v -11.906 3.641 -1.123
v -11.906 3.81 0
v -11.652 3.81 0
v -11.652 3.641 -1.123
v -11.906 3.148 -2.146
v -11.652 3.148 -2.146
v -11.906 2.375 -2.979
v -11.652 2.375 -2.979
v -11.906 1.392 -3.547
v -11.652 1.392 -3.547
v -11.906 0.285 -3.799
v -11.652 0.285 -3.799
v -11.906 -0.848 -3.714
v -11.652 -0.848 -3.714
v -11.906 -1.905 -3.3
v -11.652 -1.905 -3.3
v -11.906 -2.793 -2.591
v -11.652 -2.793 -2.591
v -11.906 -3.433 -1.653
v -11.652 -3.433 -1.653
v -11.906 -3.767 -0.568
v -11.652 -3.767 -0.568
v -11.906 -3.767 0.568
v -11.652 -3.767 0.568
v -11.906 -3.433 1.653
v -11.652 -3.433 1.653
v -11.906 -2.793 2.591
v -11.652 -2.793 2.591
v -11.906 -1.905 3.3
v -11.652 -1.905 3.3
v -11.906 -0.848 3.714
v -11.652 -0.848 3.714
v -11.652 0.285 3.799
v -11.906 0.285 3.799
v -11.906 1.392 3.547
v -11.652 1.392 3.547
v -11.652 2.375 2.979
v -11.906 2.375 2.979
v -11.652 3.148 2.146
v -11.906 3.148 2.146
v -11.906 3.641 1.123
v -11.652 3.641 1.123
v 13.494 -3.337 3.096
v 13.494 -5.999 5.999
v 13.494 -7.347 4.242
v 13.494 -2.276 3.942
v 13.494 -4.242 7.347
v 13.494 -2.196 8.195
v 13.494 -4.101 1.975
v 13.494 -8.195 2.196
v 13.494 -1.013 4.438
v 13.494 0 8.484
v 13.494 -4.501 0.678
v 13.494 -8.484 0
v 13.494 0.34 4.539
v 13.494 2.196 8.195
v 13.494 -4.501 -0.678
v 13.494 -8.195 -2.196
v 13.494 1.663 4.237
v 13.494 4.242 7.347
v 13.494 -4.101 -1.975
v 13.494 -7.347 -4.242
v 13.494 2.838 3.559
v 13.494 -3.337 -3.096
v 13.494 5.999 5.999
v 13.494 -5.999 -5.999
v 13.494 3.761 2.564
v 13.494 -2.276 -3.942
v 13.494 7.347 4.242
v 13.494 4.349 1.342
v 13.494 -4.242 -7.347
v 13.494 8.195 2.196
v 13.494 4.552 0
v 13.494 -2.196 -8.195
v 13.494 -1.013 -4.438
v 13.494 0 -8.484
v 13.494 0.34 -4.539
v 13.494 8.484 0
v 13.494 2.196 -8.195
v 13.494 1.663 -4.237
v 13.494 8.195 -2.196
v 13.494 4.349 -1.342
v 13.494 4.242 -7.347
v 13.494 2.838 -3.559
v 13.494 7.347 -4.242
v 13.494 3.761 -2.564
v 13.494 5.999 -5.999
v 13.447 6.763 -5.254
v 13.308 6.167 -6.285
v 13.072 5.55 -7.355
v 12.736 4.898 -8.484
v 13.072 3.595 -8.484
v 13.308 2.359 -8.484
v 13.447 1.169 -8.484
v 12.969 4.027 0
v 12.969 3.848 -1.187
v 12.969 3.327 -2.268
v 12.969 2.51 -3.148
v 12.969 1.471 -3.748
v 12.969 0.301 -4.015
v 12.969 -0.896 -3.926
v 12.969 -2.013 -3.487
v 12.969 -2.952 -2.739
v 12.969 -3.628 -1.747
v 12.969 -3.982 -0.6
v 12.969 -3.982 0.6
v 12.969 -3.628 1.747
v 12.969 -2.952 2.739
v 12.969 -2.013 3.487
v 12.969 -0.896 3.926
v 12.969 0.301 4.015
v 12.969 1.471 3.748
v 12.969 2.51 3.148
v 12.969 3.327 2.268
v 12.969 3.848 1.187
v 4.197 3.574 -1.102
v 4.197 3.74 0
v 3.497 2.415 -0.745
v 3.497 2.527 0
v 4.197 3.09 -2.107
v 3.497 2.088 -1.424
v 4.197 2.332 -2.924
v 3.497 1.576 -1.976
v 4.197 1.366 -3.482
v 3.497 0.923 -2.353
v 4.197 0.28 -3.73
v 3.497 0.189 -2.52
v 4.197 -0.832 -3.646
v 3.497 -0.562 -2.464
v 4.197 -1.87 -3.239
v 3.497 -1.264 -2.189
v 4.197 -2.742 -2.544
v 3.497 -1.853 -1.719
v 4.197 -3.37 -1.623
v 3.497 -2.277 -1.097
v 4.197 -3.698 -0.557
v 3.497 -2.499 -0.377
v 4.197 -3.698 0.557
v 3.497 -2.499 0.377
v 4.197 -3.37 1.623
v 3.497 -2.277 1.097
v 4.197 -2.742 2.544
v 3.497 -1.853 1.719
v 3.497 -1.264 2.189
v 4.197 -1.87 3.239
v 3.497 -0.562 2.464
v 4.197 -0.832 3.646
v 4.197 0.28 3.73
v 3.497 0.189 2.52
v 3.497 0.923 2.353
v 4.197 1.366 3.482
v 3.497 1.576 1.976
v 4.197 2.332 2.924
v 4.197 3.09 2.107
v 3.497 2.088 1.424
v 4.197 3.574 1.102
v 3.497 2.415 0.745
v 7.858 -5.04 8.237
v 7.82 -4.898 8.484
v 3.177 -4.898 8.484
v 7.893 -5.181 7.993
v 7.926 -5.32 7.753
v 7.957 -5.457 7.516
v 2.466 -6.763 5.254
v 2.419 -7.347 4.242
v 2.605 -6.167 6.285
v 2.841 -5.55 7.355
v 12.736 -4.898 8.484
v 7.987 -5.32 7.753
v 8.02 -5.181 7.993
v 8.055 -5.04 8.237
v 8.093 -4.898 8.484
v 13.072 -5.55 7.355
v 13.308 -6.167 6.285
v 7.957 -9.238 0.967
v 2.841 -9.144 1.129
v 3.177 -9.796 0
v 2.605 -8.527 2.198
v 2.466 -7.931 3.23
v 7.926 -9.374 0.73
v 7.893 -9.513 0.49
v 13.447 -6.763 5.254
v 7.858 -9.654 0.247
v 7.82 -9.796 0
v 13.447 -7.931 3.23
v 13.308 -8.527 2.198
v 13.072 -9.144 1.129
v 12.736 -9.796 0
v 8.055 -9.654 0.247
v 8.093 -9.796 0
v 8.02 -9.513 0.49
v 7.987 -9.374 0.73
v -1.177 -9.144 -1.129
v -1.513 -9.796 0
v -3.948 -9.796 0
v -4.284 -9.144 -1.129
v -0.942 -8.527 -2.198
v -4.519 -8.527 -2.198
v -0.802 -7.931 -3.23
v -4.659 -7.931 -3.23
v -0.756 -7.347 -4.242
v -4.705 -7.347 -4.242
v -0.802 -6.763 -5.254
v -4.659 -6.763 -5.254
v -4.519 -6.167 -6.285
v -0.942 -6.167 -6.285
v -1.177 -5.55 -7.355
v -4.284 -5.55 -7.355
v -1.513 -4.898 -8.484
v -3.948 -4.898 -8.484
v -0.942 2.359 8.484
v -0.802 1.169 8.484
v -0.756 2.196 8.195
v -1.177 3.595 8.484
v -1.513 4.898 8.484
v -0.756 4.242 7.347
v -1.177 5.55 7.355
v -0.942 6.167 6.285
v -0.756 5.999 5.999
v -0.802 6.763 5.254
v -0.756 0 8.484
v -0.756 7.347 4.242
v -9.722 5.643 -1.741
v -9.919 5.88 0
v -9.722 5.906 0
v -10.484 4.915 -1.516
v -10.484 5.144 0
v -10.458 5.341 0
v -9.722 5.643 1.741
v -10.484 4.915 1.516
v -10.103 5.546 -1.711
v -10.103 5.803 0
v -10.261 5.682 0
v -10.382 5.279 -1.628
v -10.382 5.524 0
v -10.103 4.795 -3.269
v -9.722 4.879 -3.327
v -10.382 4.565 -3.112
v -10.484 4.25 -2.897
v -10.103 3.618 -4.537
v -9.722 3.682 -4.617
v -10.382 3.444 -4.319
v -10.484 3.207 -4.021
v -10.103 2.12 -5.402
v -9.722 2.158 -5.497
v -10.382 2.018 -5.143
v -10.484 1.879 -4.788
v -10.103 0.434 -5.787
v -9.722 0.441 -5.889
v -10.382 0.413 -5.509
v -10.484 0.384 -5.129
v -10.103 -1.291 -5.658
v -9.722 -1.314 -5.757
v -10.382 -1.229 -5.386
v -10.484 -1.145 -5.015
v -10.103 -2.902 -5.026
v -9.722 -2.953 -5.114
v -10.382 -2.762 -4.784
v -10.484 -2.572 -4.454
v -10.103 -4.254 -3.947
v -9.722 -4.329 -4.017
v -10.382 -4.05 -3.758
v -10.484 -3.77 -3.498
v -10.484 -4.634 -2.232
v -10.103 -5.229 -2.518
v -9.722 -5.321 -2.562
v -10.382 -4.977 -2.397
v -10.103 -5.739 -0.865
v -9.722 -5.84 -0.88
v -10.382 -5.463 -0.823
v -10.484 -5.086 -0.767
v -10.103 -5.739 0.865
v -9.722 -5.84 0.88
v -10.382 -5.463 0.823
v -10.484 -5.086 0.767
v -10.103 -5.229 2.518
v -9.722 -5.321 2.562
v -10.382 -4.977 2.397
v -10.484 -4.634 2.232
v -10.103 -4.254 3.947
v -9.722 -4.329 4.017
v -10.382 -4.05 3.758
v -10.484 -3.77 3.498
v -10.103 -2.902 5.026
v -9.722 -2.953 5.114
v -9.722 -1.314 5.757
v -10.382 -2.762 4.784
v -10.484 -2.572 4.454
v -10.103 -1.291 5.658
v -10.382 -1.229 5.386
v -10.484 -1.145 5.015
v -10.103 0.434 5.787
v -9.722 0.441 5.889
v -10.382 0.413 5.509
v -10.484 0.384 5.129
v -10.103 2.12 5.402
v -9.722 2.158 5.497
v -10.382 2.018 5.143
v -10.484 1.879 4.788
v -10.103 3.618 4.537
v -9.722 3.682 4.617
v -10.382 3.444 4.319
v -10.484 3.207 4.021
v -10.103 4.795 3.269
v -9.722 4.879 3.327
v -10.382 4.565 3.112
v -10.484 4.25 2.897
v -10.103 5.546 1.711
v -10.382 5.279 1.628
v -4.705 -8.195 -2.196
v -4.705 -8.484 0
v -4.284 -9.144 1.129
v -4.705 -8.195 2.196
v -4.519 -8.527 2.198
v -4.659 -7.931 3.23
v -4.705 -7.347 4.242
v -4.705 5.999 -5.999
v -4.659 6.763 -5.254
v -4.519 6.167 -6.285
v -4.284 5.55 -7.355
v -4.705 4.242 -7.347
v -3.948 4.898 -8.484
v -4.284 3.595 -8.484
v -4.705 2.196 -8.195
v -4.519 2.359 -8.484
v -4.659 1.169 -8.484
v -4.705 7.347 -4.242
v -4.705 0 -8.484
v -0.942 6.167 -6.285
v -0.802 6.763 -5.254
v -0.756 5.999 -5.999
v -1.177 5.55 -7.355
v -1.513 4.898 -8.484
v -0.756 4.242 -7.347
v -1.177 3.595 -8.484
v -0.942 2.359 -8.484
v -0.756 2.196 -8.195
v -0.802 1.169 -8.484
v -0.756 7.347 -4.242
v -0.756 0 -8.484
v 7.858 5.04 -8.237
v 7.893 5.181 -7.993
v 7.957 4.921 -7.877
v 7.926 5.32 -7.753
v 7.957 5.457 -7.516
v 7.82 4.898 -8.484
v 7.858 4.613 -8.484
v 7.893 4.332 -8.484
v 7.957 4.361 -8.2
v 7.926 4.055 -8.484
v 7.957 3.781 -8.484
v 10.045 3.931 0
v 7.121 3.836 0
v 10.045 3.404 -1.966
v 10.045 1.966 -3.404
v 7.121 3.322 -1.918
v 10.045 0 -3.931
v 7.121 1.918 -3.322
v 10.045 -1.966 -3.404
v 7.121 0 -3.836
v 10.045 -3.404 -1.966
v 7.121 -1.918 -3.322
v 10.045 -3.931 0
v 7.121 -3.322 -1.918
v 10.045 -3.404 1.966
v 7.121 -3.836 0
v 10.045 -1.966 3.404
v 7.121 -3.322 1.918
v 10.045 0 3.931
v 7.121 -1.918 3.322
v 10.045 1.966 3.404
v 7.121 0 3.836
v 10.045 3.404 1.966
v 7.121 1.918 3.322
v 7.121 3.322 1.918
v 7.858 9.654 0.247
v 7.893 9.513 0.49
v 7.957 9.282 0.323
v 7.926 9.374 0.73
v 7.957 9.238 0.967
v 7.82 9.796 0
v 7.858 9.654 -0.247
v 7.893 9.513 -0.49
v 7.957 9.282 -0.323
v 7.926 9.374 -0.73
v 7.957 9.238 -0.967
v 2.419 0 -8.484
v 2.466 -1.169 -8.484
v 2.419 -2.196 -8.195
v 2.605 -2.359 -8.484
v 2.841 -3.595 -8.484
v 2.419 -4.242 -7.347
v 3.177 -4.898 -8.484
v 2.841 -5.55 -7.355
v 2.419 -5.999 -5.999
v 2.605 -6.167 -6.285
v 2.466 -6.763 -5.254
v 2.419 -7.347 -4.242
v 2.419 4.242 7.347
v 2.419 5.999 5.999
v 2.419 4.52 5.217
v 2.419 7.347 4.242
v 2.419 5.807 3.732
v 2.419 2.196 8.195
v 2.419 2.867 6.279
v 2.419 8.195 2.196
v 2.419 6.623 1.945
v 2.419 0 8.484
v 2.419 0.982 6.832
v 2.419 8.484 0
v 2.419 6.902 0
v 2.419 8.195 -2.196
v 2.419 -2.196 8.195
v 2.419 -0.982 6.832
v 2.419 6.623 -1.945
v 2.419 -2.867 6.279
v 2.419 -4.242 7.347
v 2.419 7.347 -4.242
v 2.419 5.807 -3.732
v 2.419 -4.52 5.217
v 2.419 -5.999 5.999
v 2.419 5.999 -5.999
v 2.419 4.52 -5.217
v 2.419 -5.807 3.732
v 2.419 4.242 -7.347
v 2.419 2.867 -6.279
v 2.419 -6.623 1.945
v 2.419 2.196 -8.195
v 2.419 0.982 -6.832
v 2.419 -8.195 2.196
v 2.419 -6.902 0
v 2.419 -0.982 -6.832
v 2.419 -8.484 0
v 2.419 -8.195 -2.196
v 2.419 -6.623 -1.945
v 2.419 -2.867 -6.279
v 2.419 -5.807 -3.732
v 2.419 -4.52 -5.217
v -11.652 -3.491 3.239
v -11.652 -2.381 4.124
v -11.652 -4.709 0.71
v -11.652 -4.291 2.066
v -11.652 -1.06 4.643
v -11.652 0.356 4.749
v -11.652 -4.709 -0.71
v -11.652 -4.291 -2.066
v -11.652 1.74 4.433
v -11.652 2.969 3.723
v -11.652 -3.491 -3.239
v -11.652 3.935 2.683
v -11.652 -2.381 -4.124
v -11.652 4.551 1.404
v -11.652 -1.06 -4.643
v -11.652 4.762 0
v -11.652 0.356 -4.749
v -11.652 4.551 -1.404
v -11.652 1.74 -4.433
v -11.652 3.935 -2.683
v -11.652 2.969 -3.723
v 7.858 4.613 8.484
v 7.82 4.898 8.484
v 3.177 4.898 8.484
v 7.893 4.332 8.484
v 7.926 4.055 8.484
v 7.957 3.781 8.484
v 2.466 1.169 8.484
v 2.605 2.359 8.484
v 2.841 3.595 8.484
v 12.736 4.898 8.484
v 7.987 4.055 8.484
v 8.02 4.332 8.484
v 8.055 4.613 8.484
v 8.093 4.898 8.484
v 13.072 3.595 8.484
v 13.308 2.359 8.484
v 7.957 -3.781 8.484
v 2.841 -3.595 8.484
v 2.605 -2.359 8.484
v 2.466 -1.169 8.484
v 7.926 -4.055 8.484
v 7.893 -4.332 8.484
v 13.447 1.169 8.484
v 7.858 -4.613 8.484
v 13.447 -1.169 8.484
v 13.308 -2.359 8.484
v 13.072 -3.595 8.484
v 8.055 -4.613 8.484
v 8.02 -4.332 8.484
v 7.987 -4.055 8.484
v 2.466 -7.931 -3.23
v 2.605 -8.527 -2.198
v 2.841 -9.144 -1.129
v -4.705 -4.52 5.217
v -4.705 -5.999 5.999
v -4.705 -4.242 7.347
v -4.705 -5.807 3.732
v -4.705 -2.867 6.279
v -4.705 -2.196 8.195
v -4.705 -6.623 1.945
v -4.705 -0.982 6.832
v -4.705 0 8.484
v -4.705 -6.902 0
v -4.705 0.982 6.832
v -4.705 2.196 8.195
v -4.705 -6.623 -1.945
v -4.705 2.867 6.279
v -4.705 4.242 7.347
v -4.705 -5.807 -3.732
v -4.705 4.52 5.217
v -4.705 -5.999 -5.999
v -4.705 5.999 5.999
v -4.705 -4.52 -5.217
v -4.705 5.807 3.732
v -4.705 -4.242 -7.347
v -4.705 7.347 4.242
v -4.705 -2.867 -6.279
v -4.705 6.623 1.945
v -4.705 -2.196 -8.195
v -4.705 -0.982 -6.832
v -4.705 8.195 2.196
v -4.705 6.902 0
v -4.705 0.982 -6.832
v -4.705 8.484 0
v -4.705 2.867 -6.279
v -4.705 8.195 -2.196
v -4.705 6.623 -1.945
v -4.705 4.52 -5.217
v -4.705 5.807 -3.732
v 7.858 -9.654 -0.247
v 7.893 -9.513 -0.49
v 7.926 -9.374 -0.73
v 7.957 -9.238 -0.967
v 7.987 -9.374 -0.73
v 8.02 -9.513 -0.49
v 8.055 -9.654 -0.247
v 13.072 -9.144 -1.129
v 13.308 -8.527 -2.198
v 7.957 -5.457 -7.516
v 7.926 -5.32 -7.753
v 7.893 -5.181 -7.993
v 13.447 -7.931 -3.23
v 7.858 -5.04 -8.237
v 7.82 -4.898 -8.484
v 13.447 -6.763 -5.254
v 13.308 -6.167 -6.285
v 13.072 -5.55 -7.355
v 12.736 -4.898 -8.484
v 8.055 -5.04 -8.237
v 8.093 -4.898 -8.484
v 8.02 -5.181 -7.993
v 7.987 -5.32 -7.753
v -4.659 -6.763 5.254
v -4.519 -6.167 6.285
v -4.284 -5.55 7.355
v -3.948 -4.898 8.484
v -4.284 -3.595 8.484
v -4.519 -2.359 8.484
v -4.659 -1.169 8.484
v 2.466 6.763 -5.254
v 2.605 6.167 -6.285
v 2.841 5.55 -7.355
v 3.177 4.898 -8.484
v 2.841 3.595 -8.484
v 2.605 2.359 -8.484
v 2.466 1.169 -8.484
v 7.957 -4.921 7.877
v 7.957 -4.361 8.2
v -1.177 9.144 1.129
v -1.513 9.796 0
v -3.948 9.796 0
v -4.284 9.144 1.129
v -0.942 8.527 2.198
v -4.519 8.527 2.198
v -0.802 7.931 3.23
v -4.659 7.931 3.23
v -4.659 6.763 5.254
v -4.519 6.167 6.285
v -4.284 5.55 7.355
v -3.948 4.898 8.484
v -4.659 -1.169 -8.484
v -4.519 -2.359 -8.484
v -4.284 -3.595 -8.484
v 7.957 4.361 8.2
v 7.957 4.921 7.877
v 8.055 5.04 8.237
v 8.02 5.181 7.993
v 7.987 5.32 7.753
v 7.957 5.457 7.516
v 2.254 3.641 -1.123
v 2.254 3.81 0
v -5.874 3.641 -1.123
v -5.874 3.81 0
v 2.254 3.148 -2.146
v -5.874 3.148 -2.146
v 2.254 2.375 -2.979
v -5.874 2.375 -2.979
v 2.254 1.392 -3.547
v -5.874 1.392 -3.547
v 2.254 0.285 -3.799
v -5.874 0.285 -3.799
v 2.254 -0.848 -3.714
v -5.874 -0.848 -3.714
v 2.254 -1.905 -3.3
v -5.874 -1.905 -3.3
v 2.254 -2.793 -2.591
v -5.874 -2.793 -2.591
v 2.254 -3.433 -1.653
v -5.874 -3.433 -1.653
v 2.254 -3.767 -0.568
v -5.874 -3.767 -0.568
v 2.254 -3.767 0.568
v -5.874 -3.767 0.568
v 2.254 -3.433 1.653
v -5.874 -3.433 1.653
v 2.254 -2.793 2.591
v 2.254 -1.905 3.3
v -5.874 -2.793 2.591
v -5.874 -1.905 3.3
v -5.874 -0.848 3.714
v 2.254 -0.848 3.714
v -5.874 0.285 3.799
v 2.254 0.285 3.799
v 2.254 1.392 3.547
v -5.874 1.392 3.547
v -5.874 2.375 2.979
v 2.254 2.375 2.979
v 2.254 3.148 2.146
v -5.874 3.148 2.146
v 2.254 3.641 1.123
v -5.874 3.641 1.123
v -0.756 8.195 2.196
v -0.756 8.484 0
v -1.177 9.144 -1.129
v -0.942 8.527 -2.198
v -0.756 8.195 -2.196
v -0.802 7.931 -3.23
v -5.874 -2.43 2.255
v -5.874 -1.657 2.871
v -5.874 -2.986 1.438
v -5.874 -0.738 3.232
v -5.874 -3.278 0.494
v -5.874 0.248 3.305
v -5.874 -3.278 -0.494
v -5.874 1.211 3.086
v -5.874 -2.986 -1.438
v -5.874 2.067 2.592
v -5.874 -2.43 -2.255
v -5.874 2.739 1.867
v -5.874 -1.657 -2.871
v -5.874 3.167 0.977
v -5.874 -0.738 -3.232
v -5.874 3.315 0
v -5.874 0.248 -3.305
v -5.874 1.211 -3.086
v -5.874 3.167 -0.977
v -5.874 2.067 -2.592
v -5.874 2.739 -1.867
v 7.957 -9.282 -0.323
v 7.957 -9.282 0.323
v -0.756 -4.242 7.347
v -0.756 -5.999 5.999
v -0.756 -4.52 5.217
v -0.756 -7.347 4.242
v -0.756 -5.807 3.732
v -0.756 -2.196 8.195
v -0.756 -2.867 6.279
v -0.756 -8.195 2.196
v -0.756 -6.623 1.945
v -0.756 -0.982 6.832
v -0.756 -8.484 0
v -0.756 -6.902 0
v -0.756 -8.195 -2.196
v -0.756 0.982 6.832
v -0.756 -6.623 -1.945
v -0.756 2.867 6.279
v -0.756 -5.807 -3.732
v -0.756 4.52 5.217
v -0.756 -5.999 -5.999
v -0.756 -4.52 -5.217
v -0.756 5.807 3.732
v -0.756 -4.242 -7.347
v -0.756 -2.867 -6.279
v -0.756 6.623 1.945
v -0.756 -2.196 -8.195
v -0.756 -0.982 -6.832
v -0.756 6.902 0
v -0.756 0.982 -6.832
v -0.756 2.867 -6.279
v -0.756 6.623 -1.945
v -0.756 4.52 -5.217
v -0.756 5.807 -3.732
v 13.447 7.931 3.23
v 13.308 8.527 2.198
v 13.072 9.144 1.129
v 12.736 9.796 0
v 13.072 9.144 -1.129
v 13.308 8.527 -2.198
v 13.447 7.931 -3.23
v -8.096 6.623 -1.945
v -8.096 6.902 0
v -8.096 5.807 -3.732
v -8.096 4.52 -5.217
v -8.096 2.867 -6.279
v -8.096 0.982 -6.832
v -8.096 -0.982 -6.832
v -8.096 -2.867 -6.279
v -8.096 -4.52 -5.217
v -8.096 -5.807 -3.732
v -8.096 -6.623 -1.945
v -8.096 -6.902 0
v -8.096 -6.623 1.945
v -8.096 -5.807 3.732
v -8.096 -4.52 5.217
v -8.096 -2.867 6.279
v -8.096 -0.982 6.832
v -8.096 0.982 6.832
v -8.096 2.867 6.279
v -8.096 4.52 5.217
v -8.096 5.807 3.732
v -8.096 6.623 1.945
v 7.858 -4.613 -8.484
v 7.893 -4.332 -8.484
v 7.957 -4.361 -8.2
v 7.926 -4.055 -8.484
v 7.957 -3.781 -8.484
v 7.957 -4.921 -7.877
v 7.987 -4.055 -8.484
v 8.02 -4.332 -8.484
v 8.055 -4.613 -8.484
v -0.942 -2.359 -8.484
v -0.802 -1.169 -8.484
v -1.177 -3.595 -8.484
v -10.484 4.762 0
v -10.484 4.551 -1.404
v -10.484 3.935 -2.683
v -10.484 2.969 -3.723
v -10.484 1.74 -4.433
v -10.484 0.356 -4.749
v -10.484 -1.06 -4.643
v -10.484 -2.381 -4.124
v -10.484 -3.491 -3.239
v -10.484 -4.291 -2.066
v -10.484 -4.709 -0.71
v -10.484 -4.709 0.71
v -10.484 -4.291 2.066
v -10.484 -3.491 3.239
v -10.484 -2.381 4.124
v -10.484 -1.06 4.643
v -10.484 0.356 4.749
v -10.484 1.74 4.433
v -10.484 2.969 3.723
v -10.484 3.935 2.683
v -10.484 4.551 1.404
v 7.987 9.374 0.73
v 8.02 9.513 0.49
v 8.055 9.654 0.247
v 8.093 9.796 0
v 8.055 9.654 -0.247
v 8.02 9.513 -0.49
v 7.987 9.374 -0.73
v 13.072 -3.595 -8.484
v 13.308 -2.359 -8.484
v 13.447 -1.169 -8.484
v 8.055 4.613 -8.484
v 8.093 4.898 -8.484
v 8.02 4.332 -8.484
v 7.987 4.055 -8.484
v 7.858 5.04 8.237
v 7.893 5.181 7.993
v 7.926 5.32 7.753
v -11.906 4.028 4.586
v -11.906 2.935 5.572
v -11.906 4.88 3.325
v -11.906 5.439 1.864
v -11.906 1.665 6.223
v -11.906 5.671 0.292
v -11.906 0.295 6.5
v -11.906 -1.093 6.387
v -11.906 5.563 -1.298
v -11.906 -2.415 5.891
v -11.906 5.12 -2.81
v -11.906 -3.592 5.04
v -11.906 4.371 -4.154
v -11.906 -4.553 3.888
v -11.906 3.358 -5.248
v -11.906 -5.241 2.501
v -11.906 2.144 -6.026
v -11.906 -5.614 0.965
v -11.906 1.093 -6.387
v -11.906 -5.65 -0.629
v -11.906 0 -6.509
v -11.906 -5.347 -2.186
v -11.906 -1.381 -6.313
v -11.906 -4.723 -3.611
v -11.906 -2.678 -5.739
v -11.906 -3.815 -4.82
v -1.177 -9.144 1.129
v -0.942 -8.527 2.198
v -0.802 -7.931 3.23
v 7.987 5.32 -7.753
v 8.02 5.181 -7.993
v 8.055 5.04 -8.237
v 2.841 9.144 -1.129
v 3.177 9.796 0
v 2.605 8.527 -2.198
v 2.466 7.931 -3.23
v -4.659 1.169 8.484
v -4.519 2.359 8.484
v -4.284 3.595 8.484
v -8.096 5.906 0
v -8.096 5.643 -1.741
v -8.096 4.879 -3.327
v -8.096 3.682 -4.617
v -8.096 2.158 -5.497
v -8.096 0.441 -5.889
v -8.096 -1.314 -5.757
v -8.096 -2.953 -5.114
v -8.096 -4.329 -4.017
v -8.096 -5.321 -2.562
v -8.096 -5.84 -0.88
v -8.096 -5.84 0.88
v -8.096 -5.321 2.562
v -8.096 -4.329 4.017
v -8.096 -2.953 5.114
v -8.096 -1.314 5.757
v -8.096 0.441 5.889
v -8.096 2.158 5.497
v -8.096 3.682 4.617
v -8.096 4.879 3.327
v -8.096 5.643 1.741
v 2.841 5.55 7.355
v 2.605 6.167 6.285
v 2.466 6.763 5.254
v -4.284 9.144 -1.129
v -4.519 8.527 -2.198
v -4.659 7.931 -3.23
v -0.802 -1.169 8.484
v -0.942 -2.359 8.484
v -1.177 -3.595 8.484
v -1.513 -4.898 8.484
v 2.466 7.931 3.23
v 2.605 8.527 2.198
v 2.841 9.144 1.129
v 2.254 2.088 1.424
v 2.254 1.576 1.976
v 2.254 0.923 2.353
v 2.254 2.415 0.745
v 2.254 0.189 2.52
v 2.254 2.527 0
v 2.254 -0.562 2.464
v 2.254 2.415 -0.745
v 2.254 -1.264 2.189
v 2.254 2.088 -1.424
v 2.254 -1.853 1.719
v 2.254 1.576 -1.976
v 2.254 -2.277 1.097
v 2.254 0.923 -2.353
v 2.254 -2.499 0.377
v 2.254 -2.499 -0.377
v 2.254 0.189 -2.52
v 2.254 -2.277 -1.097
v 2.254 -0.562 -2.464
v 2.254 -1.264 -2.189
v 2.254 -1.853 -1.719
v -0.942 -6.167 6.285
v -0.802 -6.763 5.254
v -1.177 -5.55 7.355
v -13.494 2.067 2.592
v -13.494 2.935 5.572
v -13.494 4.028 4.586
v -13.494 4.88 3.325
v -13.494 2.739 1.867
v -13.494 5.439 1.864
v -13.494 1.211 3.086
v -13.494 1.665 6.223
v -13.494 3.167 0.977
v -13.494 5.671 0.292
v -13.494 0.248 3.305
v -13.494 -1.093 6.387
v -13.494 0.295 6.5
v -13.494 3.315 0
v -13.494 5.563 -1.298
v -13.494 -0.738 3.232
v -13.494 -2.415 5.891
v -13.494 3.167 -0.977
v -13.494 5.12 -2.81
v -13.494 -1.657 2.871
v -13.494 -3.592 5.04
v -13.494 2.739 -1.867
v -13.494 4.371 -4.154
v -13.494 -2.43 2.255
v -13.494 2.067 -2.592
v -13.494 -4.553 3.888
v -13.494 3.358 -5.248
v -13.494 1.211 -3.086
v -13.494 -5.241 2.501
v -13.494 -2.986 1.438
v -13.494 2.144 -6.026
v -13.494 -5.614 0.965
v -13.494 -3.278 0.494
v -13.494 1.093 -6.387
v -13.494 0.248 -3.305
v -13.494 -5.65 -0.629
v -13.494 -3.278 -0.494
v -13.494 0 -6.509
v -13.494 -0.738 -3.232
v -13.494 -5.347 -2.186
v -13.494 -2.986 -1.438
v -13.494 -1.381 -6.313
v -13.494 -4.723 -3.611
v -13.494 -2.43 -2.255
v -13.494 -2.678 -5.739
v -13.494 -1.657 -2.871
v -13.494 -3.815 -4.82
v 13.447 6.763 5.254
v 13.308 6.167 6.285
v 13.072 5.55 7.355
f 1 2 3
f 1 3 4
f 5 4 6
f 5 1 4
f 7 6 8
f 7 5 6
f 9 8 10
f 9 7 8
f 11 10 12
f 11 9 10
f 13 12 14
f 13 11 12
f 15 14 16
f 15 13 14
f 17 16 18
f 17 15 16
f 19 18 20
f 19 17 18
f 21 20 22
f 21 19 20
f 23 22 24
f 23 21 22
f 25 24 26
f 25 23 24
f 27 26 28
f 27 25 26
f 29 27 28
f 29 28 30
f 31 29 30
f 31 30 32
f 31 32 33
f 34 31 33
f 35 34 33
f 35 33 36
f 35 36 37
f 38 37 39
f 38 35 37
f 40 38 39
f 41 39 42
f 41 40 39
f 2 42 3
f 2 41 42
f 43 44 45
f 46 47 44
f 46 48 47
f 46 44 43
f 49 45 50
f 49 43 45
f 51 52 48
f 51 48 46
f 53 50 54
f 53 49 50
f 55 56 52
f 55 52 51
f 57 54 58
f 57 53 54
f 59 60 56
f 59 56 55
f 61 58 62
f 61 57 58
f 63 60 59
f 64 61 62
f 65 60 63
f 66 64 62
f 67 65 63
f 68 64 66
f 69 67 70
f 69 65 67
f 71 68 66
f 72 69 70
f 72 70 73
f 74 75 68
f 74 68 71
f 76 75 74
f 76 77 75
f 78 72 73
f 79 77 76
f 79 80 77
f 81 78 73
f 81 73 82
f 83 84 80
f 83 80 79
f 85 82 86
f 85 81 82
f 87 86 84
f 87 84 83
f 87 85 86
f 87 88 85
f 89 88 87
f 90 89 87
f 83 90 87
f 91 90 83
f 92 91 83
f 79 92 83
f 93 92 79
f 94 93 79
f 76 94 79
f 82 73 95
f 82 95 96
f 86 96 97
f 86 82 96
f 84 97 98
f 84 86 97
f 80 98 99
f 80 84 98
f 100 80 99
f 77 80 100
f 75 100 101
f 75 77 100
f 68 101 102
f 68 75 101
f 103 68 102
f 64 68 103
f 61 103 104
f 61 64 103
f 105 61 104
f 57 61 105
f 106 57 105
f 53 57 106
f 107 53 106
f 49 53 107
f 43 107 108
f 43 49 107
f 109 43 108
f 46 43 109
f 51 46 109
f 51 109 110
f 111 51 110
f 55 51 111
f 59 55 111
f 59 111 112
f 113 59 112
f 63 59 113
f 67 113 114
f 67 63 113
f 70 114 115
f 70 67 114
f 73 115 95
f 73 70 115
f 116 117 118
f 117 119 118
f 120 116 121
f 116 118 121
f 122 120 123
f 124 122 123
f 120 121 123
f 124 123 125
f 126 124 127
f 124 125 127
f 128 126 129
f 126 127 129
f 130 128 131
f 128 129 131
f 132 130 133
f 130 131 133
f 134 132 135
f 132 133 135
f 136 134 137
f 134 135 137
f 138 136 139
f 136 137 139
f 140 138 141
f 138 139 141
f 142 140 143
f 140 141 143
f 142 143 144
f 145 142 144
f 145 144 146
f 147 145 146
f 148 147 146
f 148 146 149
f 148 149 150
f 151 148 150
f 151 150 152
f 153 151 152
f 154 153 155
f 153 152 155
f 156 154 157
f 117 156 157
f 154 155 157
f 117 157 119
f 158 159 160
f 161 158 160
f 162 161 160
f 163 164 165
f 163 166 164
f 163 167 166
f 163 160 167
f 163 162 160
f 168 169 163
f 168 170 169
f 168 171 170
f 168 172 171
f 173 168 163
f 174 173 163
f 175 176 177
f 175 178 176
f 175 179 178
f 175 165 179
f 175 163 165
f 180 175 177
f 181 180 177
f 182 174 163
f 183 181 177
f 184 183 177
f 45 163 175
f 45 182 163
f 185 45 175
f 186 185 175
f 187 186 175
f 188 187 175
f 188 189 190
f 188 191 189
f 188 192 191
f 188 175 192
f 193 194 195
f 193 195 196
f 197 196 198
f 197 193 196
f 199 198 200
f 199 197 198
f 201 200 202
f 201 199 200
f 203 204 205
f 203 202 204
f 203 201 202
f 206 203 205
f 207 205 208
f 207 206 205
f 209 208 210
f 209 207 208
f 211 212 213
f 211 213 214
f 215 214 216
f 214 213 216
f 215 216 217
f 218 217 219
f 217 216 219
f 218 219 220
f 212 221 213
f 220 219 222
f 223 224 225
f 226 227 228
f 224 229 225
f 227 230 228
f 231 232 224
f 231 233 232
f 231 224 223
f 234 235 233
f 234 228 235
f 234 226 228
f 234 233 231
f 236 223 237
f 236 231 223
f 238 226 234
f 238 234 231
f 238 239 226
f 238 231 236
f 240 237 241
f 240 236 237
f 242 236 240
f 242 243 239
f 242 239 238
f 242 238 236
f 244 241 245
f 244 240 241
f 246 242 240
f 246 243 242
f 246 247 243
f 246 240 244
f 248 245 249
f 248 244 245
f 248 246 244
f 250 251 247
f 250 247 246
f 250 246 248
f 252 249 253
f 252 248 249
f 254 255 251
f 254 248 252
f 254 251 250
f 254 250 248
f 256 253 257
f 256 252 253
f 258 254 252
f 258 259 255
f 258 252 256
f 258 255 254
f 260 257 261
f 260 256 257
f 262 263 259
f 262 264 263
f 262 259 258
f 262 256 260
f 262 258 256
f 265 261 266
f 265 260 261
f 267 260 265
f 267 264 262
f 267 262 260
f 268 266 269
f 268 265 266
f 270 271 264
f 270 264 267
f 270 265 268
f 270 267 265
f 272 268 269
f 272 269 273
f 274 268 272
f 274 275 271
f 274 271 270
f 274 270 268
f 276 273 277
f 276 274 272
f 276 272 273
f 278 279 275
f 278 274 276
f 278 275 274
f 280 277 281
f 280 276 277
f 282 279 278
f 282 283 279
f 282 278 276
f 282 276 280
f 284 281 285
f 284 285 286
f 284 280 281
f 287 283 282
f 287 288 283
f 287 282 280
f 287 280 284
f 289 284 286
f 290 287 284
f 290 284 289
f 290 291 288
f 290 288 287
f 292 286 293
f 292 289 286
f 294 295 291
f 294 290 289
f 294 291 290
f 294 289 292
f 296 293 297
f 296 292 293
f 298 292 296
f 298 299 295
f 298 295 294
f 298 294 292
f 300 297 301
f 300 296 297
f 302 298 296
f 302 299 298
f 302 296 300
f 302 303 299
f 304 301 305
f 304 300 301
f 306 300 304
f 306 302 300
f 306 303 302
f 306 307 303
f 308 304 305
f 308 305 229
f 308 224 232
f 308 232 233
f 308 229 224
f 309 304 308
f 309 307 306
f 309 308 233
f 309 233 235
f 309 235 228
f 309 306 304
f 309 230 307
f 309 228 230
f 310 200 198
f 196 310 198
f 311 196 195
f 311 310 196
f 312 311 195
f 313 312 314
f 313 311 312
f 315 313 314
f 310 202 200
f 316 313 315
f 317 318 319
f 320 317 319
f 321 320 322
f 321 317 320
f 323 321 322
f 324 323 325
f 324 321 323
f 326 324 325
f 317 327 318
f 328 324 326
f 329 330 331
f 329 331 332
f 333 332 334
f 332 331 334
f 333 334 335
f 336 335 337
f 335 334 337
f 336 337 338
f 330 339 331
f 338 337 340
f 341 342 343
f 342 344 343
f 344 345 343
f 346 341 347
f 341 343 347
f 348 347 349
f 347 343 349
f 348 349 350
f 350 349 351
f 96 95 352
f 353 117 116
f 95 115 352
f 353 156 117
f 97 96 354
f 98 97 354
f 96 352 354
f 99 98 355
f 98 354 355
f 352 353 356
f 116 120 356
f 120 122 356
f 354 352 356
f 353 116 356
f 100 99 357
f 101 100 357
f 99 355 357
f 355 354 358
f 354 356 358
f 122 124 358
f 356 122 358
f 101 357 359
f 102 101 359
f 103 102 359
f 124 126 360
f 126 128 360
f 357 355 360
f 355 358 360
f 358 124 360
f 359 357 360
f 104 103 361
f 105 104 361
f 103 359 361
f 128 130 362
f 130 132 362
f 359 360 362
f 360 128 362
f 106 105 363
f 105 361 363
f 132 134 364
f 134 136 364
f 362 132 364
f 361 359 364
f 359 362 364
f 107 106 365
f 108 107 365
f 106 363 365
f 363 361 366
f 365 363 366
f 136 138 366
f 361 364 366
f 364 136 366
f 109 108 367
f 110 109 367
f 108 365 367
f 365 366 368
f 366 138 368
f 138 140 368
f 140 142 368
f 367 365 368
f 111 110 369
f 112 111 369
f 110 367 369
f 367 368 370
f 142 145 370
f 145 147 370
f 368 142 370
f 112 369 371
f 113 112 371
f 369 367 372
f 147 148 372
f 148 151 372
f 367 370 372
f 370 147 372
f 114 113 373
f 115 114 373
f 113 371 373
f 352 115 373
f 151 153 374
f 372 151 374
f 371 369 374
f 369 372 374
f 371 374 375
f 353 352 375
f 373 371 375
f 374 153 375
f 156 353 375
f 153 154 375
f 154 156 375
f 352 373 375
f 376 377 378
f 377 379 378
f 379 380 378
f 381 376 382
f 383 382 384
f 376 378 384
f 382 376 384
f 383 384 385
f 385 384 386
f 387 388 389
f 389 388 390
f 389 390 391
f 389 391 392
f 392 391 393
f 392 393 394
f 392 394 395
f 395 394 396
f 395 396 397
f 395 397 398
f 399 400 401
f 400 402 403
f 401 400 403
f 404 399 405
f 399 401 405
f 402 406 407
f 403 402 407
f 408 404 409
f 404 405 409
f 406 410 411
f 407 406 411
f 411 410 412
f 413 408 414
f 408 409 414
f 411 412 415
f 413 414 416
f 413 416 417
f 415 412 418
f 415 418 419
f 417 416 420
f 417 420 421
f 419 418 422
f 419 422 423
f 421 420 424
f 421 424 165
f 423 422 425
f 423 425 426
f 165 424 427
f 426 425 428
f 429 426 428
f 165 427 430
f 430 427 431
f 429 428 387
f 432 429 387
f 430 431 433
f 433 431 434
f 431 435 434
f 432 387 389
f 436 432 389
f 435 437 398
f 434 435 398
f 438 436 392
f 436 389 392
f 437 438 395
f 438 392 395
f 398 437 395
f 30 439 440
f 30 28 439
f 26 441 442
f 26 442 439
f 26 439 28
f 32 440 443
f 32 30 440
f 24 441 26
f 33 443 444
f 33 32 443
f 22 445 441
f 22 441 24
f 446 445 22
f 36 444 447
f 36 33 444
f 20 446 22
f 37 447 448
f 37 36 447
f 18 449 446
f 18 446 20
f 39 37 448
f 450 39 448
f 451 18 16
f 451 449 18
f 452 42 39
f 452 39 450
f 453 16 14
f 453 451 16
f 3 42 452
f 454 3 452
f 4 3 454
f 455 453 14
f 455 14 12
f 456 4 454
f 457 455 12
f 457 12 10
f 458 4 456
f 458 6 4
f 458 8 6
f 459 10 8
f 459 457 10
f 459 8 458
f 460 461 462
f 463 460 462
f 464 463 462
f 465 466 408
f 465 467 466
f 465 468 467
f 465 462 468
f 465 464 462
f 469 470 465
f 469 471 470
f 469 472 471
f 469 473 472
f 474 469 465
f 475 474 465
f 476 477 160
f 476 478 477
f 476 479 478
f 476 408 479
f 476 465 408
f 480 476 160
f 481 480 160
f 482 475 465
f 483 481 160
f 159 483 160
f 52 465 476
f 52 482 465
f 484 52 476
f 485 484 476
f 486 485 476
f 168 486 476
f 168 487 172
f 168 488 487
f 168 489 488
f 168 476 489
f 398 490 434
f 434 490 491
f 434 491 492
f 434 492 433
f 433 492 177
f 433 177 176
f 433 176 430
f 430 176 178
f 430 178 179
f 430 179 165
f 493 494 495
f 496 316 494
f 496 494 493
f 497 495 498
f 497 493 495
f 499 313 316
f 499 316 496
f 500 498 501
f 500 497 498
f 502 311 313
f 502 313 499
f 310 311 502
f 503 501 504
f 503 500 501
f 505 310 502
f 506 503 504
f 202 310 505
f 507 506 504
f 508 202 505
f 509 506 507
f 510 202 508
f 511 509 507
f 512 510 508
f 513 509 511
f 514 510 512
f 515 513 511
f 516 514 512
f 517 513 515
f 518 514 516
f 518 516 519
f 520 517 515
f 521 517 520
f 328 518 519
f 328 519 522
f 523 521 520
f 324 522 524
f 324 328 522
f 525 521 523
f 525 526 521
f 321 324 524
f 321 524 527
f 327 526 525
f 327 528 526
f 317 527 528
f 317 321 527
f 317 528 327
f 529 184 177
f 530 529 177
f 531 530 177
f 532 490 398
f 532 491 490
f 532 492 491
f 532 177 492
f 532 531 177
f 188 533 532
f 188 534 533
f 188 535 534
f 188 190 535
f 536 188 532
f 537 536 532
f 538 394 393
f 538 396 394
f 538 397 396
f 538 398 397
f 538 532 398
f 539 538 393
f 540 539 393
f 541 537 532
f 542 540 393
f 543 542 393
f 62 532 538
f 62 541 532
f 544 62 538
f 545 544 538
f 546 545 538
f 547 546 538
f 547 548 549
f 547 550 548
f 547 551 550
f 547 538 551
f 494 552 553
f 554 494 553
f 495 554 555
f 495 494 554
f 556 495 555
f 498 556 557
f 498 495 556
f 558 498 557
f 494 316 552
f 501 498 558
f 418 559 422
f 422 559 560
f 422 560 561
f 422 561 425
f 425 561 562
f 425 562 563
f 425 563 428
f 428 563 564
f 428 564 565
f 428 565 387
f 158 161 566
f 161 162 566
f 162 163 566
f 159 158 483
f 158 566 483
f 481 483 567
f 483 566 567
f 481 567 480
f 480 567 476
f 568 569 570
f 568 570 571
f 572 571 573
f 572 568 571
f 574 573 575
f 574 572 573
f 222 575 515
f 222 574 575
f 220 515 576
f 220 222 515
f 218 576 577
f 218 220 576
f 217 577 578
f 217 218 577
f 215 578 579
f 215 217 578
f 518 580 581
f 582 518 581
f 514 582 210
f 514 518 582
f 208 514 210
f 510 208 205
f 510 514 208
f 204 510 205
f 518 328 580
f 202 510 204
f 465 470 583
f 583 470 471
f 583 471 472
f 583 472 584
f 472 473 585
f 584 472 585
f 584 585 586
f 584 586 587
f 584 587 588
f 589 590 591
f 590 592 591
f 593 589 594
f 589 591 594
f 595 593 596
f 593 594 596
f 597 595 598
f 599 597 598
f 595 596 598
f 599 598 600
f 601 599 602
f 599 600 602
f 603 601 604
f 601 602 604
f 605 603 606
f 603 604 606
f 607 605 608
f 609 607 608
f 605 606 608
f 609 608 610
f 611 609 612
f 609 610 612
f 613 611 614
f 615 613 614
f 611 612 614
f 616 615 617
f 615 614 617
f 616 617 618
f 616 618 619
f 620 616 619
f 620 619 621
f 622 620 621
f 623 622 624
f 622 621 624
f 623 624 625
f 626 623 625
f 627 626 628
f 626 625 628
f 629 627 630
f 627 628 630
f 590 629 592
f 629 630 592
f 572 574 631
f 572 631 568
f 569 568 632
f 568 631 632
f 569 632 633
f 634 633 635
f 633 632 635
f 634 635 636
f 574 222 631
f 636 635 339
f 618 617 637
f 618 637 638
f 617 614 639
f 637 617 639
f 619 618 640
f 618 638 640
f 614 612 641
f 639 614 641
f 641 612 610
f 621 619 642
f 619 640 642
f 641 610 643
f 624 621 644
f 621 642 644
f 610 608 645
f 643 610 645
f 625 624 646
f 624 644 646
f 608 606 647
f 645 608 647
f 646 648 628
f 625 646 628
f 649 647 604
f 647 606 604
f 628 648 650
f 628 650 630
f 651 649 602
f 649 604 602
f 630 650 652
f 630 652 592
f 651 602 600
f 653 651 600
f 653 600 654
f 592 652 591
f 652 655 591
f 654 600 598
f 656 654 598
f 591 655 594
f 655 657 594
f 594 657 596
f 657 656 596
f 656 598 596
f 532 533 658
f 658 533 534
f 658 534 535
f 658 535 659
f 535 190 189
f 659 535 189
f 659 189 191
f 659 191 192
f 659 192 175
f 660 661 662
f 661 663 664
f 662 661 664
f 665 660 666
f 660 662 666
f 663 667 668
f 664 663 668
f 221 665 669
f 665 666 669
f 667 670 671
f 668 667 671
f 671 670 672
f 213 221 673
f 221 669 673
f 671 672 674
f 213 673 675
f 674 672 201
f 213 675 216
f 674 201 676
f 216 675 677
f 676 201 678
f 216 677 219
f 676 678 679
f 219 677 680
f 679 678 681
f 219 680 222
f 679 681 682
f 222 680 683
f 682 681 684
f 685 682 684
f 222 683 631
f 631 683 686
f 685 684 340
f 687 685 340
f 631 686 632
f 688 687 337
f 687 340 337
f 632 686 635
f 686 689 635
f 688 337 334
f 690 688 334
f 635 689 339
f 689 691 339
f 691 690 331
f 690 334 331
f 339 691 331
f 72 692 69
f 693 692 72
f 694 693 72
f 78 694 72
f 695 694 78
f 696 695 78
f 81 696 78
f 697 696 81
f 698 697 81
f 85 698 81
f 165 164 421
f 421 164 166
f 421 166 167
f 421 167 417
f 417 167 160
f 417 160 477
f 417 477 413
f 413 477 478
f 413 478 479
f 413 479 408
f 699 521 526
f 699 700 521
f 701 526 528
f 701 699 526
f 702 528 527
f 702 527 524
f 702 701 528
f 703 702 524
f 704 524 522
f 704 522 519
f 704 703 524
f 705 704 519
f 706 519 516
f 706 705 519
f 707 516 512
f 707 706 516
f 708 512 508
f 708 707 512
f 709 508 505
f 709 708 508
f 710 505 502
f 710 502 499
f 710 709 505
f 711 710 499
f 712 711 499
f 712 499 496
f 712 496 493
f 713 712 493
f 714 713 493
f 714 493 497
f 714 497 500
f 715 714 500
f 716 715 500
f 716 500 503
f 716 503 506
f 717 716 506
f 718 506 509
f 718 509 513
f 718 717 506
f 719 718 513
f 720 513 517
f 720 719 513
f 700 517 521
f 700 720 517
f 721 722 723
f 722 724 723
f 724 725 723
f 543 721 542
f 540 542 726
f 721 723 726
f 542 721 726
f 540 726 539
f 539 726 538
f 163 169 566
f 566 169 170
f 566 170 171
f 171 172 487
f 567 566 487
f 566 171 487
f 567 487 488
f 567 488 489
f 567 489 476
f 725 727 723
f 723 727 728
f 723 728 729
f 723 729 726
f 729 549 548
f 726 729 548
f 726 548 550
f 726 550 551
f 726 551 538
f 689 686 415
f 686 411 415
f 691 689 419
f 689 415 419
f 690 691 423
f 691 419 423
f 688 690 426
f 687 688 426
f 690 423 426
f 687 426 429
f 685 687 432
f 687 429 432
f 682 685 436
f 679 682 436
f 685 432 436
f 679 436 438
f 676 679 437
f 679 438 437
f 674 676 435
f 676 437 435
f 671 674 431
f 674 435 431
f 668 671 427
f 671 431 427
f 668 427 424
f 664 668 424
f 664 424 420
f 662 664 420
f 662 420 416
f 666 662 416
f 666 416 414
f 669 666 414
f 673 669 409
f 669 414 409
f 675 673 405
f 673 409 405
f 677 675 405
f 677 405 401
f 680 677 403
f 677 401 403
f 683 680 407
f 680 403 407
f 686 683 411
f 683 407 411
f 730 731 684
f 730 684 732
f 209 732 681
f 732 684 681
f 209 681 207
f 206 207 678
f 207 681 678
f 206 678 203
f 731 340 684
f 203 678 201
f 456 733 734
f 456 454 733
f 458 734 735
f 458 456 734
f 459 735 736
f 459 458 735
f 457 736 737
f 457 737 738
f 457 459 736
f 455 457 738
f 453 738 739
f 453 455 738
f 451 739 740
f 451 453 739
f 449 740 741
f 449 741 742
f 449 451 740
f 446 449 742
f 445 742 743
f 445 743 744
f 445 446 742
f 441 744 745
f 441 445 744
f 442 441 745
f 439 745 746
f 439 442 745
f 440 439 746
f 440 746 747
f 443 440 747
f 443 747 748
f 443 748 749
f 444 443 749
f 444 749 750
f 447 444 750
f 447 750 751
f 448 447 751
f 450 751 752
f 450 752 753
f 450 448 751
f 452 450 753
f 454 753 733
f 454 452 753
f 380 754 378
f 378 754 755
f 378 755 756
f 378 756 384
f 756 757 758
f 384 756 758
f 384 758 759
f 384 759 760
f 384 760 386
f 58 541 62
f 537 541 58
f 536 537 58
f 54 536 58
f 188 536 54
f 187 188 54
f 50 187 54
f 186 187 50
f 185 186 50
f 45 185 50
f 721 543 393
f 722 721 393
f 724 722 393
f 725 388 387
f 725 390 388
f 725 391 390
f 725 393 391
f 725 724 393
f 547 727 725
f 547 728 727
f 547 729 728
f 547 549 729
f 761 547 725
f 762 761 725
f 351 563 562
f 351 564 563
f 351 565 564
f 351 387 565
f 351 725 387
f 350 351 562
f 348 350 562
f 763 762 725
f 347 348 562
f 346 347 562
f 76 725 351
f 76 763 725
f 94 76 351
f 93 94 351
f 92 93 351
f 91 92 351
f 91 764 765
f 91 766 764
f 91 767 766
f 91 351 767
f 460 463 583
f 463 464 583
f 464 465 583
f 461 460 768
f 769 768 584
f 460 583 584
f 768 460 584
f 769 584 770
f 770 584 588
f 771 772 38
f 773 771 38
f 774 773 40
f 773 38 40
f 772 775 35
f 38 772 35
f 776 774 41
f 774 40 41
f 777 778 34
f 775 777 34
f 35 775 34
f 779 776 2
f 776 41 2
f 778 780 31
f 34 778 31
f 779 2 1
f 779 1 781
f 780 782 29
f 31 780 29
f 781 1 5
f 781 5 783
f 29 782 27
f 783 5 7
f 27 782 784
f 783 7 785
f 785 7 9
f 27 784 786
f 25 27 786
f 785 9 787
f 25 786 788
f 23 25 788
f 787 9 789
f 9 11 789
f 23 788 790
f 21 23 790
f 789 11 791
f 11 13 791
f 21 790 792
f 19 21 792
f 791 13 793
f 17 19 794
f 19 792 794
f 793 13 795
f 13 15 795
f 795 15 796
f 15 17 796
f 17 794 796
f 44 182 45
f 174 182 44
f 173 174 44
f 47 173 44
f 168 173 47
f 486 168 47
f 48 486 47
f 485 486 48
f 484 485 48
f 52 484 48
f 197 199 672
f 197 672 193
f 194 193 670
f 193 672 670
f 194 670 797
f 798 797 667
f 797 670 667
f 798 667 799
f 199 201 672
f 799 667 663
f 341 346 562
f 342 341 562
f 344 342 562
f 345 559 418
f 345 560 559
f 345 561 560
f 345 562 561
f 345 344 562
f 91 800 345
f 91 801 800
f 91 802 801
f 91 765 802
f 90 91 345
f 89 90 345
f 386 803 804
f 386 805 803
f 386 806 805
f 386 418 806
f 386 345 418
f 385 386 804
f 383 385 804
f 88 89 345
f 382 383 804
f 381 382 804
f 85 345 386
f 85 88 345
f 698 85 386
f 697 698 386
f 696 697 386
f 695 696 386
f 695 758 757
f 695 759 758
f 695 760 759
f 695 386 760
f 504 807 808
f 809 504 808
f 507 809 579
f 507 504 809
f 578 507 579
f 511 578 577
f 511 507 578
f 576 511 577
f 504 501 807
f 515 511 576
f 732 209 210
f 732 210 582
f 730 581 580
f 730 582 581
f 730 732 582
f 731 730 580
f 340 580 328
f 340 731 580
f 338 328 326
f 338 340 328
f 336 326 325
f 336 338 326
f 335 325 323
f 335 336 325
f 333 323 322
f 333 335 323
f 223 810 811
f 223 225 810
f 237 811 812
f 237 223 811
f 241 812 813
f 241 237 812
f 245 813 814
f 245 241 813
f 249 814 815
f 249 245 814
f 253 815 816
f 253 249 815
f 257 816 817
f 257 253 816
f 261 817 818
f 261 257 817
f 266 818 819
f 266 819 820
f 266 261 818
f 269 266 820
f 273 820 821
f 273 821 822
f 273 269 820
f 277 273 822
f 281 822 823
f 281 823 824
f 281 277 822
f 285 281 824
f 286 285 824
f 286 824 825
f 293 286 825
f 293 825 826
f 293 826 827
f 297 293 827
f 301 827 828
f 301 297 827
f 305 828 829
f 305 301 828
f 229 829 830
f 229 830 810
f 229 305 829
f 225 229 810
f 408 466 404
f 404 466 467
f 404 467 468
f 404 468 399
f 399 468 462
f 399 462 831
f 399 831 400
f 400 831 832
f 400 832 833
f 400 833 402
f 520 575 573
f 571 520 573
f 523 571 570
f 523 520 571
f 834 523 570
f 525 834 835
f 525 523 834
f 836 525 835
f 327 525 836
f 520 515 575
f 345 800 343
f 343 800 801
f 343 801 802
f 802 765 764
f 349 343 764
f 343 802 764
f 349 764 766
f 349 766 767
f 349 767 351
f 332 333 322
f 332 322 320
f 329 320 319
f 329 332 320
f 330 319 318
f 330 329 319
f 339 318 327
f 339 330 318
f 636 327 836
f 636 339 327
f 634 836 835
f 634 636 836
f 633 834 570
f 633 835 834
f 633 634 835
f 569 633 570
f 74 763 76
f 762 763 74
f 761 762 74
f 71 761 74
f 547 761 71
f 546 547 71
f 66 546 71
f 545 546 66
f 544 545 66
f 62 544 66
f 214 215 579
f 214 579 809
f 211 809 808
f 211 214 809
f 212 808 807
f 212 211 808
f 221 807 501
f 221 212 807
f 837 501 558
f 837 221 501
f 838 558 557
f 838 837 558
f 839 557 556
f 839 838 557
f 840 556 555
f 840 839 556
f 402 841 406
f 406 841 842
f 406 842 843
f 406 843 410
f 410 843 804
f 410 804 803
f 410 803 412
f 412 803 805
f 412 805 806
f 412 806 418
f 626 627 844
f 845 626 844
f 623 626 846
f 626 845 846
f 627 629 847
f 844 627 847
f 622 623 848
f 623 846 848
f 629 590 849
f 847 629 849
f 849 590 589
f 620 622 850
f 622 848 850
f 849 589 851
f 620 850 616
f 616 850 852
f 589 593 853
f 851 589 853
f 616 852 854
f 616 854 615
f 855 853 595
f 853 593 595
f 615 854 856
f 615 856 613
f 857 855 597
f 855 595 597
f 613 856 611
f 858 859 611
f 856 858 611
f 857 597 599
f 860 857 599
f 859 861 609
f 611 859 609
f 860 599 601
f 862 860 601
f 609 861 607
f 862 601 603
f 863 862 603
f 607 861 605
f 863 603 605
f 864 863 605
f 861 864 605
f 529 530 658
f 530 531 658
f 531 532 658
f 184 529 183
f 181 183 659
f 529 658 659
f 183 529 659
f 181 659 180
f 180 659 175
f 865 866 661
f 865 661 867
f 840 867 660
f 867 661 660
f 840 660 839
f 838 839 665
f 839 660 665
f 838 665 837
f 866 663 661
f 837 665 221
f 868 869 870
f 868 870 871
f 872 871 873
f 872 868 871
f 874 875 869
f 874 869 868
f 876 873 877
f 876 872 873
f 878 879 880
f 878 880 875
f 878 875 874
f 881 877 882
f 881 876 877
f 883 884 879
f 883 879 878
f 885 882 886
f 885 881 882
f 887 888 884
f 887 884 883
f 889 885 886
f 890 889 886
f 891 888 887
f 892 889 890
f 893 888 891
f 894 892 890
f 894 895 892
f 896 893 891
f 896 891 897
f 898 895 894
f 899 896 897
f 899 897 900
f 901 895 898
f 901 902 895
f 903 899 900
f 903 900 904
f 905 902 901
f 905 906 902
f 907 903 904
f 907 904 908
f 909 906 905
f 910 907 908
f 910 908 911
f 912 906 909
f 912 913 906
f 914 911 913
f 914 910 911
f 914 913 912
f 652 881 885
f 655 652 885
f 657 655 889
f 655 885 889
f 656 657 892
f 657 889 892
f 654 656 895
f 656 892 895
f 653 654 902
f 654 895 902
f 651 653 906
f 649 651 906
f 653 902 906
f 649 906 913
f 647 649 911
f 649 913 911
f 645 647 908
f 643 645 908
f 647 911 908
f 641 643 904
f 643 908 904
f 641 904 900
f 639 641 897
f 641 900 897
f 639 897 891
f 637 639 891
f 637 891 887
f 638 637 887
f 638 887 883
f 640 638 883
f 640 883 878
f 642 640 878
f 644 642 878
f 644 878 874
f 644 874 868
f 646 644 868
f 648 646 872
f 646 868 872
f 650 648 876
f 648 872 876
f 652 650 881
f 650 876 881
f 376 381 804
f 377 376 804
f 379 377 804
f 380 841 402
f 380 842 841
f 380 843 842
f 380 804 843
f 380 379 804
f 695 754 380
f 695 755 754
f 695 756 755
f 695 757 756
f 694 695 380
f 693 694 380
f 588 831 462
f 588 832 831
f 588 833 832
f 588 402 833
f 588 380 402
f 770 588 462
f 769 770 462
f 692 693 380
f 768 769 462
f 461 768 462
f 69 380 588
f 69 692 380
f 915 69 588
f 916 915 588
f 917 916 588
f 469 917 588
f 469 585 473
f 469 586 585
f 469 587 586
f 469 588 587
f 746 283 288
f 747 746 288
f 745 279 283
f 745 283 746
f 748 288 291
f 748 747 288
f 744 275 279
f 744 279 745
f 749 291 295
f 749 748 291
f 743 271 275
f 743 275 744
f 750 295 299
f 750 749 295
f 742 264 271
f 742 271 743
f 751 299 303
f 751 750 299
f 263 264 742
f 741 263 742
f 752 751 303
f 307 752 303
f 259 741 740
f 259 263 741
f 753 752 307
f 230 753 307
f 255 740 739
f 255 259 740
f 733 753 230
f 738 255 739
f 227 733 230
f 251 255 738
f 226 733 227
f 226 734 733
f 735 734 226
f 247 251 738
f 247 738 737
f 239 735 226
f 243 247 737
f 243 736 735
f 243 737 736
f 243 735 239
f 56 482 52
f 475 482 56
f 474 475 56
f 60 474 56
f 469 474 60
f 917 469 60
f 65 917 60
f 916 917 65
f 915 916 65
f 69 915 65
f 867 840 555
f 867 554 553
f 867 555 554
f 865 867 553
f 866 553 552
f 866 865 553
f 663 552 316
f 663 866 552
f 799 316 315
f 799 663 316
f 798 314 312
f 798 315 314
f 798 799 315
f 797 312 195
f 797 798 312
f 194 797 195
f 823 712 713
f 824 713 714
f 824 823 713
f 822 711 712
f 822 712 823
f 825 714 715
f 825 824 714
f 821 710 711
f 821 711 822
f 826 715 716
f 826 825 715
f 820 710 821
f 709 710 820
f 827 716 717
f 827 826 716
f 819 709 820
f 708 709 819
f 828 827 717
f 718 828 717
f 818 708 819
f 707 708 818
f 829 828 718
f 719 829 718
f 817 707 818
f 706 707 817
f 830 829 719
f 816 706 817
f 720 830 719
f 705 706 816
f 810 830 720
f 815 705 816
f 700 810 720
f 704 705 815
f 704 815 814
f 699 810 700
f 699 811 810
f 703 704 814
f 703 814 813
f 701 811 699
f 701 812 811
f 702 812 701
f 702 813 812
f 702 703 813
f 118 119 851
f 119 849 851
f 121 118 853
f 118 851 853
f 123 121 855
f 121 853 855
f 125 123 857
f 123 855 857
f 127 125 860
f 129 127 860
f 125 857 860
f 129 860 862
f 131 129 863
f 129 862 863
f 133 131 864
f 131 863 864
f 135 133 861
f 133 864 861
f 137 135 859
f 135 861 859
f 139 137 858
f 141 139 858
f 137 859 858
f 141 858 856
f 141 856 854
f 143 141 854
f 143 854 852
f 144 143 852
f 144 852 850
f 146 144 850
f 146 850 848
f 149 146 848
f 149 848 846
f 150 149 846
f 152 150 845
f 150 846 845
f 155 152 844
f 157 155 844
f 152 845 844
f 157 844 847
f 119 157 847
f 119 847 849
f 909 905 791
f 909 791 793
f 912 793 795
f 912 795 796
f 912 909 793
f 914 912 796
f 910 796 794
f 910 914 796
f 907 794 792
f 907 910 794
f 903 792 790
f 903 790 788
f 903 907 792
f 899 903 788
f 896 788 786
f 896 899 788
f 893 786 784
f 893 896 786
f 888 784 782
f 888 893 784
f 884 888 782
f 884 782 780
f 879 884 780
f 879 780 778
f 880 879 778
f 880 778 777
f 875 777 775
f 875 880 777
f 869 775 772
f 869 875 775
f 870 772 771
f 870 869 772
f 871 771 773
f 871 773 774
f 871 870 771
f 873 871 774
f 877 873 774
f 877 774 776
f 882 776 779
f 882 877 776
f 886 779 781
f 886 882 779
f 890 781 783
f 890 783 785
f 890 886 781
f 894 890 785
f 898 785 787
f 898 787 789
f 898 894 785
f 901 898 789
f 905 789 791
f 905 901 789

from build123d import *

# Parameters (mm, degrees)
BOSS_EXTRUDE1_DEPTH = 13.49375
CHAMFER1_SIZE2      = 0.508
CHAMFER1_SIZE       = 0.525425432
SKETCH3_RX          = 6.50875
SKETCH3_RY          = 5.6769
SKETCH3_R           = 3.3147
BOSS_EXTRUDE2_DEPTH = 1.5875


with BuildPart() as part:
    # Sketch1 → Boss-Extrude1 (new body, symmetric)
    with BuildSketch(Plane(origin=(0, 0, 0), x_dir=(0, 0, -1), z_dir=(1, 0, 0))):
        Polygon((0, 9.796017487), (-8.4836, 4.898008744), (-8.4836, -4.898008744), (0, -9.796017487), (8.4836, -4.898008744), (8.4836, 4.898008744), align=None)
    extrude(amount=BOSS_EXTRUDE1_DEPTH, both=True)

    # Sketch2 → Cut-Revolve1 (revolve, cut)
    with BuildSketch(Plane.XY):
        Polygon((13.49375, 9.796017487), (13.49375, 8.4836), (12.73602541, 9.796017487), align=None)
        Polygon((3.17707459, 9.796017487), (-1.51337459, 9.796017487), (-0.75565, 8.4836), (-0.75565, 6.90245), (2.41935, 6.90245), (2.41935, 8.4836), align=None)
        Polygon((7.82043181, 9.796017487), (7.95655, 9.288017487), (8.09266819, 9.796017487), align=None)
        with BuildLine():
            Line((-3.94762541, 9.796017487), (-4.70535, 8.4836))
            Line((-4.70535, 8.4836), (-4.70535, 6.90245))
            Line((-4.70535, 6.90245), (-8.09625, 6.90245))
            Line((-8.09625, 6.90245), (-8.09625, 5.9055))
            Line((-8.09625, 5.9055), (-9.72185, 5.9055))
            ThreePointArc((-9.72185, 5.9055), (-10.260665367, 5.682315367), (-10.48385, 5.1435))
            Line((-10.48385, 5.1435), (-10.48385, 4.7625))
            Line((-10.48385, 4.7625), (-11.65225, 4.7625))
            Line((-11.65225, 4.7625), (-11.65225, 3.81))
            Line((-11.65225, 3.81), (-13.49375, 3.81))
            Line((-13.49375, 3.81), (-13.49375, 9.796017487))
            Line((-13.49375, 9.796017487), (-3.94762541, 9.796017487))
        make_face()
        Polygon((13.49375, 4.043670494), (4.19735, 3.74015), (3.497110726, 2.5273), (2.25425, 2.5273), (2.25425, 3.81), (-5.87375, 3.81), (-5.87375, 3.3147), (-13.49375, 3.3147), (-13.49375, 0), (13.49375, 0), align=None)
    revolve(axis=Axis((13.49375, 0, 0), (-1, 0, 0)), mode=Mode.SUBTRACT)

    # Chamfer1
    chamfer1_edges = [part.edges().sort_by_distance(p)[0] for p in [
        (13.49375, -4.043670494, 0),
    ]]
    chamfer(chamfer1_edges, length=CHAMFER1_SIZE, length2=CHAMFER1_SIZE2)

    # Sketch3 → Boss-Extrude2 (add)
    with BuildSketch(Plane.ZY.offset(13.49375)):
        with Locations(Location((0, 0), (0, 0, 180))):
            Ellipse(SKETCH3_RX, SKETCH3_RY)
        Circle(SKETCH3_R, mode=Mode.SUBTRACT)
    extrude(amount=-BOSS_EXTRUDE2_DEPTH)


solid = part.part
